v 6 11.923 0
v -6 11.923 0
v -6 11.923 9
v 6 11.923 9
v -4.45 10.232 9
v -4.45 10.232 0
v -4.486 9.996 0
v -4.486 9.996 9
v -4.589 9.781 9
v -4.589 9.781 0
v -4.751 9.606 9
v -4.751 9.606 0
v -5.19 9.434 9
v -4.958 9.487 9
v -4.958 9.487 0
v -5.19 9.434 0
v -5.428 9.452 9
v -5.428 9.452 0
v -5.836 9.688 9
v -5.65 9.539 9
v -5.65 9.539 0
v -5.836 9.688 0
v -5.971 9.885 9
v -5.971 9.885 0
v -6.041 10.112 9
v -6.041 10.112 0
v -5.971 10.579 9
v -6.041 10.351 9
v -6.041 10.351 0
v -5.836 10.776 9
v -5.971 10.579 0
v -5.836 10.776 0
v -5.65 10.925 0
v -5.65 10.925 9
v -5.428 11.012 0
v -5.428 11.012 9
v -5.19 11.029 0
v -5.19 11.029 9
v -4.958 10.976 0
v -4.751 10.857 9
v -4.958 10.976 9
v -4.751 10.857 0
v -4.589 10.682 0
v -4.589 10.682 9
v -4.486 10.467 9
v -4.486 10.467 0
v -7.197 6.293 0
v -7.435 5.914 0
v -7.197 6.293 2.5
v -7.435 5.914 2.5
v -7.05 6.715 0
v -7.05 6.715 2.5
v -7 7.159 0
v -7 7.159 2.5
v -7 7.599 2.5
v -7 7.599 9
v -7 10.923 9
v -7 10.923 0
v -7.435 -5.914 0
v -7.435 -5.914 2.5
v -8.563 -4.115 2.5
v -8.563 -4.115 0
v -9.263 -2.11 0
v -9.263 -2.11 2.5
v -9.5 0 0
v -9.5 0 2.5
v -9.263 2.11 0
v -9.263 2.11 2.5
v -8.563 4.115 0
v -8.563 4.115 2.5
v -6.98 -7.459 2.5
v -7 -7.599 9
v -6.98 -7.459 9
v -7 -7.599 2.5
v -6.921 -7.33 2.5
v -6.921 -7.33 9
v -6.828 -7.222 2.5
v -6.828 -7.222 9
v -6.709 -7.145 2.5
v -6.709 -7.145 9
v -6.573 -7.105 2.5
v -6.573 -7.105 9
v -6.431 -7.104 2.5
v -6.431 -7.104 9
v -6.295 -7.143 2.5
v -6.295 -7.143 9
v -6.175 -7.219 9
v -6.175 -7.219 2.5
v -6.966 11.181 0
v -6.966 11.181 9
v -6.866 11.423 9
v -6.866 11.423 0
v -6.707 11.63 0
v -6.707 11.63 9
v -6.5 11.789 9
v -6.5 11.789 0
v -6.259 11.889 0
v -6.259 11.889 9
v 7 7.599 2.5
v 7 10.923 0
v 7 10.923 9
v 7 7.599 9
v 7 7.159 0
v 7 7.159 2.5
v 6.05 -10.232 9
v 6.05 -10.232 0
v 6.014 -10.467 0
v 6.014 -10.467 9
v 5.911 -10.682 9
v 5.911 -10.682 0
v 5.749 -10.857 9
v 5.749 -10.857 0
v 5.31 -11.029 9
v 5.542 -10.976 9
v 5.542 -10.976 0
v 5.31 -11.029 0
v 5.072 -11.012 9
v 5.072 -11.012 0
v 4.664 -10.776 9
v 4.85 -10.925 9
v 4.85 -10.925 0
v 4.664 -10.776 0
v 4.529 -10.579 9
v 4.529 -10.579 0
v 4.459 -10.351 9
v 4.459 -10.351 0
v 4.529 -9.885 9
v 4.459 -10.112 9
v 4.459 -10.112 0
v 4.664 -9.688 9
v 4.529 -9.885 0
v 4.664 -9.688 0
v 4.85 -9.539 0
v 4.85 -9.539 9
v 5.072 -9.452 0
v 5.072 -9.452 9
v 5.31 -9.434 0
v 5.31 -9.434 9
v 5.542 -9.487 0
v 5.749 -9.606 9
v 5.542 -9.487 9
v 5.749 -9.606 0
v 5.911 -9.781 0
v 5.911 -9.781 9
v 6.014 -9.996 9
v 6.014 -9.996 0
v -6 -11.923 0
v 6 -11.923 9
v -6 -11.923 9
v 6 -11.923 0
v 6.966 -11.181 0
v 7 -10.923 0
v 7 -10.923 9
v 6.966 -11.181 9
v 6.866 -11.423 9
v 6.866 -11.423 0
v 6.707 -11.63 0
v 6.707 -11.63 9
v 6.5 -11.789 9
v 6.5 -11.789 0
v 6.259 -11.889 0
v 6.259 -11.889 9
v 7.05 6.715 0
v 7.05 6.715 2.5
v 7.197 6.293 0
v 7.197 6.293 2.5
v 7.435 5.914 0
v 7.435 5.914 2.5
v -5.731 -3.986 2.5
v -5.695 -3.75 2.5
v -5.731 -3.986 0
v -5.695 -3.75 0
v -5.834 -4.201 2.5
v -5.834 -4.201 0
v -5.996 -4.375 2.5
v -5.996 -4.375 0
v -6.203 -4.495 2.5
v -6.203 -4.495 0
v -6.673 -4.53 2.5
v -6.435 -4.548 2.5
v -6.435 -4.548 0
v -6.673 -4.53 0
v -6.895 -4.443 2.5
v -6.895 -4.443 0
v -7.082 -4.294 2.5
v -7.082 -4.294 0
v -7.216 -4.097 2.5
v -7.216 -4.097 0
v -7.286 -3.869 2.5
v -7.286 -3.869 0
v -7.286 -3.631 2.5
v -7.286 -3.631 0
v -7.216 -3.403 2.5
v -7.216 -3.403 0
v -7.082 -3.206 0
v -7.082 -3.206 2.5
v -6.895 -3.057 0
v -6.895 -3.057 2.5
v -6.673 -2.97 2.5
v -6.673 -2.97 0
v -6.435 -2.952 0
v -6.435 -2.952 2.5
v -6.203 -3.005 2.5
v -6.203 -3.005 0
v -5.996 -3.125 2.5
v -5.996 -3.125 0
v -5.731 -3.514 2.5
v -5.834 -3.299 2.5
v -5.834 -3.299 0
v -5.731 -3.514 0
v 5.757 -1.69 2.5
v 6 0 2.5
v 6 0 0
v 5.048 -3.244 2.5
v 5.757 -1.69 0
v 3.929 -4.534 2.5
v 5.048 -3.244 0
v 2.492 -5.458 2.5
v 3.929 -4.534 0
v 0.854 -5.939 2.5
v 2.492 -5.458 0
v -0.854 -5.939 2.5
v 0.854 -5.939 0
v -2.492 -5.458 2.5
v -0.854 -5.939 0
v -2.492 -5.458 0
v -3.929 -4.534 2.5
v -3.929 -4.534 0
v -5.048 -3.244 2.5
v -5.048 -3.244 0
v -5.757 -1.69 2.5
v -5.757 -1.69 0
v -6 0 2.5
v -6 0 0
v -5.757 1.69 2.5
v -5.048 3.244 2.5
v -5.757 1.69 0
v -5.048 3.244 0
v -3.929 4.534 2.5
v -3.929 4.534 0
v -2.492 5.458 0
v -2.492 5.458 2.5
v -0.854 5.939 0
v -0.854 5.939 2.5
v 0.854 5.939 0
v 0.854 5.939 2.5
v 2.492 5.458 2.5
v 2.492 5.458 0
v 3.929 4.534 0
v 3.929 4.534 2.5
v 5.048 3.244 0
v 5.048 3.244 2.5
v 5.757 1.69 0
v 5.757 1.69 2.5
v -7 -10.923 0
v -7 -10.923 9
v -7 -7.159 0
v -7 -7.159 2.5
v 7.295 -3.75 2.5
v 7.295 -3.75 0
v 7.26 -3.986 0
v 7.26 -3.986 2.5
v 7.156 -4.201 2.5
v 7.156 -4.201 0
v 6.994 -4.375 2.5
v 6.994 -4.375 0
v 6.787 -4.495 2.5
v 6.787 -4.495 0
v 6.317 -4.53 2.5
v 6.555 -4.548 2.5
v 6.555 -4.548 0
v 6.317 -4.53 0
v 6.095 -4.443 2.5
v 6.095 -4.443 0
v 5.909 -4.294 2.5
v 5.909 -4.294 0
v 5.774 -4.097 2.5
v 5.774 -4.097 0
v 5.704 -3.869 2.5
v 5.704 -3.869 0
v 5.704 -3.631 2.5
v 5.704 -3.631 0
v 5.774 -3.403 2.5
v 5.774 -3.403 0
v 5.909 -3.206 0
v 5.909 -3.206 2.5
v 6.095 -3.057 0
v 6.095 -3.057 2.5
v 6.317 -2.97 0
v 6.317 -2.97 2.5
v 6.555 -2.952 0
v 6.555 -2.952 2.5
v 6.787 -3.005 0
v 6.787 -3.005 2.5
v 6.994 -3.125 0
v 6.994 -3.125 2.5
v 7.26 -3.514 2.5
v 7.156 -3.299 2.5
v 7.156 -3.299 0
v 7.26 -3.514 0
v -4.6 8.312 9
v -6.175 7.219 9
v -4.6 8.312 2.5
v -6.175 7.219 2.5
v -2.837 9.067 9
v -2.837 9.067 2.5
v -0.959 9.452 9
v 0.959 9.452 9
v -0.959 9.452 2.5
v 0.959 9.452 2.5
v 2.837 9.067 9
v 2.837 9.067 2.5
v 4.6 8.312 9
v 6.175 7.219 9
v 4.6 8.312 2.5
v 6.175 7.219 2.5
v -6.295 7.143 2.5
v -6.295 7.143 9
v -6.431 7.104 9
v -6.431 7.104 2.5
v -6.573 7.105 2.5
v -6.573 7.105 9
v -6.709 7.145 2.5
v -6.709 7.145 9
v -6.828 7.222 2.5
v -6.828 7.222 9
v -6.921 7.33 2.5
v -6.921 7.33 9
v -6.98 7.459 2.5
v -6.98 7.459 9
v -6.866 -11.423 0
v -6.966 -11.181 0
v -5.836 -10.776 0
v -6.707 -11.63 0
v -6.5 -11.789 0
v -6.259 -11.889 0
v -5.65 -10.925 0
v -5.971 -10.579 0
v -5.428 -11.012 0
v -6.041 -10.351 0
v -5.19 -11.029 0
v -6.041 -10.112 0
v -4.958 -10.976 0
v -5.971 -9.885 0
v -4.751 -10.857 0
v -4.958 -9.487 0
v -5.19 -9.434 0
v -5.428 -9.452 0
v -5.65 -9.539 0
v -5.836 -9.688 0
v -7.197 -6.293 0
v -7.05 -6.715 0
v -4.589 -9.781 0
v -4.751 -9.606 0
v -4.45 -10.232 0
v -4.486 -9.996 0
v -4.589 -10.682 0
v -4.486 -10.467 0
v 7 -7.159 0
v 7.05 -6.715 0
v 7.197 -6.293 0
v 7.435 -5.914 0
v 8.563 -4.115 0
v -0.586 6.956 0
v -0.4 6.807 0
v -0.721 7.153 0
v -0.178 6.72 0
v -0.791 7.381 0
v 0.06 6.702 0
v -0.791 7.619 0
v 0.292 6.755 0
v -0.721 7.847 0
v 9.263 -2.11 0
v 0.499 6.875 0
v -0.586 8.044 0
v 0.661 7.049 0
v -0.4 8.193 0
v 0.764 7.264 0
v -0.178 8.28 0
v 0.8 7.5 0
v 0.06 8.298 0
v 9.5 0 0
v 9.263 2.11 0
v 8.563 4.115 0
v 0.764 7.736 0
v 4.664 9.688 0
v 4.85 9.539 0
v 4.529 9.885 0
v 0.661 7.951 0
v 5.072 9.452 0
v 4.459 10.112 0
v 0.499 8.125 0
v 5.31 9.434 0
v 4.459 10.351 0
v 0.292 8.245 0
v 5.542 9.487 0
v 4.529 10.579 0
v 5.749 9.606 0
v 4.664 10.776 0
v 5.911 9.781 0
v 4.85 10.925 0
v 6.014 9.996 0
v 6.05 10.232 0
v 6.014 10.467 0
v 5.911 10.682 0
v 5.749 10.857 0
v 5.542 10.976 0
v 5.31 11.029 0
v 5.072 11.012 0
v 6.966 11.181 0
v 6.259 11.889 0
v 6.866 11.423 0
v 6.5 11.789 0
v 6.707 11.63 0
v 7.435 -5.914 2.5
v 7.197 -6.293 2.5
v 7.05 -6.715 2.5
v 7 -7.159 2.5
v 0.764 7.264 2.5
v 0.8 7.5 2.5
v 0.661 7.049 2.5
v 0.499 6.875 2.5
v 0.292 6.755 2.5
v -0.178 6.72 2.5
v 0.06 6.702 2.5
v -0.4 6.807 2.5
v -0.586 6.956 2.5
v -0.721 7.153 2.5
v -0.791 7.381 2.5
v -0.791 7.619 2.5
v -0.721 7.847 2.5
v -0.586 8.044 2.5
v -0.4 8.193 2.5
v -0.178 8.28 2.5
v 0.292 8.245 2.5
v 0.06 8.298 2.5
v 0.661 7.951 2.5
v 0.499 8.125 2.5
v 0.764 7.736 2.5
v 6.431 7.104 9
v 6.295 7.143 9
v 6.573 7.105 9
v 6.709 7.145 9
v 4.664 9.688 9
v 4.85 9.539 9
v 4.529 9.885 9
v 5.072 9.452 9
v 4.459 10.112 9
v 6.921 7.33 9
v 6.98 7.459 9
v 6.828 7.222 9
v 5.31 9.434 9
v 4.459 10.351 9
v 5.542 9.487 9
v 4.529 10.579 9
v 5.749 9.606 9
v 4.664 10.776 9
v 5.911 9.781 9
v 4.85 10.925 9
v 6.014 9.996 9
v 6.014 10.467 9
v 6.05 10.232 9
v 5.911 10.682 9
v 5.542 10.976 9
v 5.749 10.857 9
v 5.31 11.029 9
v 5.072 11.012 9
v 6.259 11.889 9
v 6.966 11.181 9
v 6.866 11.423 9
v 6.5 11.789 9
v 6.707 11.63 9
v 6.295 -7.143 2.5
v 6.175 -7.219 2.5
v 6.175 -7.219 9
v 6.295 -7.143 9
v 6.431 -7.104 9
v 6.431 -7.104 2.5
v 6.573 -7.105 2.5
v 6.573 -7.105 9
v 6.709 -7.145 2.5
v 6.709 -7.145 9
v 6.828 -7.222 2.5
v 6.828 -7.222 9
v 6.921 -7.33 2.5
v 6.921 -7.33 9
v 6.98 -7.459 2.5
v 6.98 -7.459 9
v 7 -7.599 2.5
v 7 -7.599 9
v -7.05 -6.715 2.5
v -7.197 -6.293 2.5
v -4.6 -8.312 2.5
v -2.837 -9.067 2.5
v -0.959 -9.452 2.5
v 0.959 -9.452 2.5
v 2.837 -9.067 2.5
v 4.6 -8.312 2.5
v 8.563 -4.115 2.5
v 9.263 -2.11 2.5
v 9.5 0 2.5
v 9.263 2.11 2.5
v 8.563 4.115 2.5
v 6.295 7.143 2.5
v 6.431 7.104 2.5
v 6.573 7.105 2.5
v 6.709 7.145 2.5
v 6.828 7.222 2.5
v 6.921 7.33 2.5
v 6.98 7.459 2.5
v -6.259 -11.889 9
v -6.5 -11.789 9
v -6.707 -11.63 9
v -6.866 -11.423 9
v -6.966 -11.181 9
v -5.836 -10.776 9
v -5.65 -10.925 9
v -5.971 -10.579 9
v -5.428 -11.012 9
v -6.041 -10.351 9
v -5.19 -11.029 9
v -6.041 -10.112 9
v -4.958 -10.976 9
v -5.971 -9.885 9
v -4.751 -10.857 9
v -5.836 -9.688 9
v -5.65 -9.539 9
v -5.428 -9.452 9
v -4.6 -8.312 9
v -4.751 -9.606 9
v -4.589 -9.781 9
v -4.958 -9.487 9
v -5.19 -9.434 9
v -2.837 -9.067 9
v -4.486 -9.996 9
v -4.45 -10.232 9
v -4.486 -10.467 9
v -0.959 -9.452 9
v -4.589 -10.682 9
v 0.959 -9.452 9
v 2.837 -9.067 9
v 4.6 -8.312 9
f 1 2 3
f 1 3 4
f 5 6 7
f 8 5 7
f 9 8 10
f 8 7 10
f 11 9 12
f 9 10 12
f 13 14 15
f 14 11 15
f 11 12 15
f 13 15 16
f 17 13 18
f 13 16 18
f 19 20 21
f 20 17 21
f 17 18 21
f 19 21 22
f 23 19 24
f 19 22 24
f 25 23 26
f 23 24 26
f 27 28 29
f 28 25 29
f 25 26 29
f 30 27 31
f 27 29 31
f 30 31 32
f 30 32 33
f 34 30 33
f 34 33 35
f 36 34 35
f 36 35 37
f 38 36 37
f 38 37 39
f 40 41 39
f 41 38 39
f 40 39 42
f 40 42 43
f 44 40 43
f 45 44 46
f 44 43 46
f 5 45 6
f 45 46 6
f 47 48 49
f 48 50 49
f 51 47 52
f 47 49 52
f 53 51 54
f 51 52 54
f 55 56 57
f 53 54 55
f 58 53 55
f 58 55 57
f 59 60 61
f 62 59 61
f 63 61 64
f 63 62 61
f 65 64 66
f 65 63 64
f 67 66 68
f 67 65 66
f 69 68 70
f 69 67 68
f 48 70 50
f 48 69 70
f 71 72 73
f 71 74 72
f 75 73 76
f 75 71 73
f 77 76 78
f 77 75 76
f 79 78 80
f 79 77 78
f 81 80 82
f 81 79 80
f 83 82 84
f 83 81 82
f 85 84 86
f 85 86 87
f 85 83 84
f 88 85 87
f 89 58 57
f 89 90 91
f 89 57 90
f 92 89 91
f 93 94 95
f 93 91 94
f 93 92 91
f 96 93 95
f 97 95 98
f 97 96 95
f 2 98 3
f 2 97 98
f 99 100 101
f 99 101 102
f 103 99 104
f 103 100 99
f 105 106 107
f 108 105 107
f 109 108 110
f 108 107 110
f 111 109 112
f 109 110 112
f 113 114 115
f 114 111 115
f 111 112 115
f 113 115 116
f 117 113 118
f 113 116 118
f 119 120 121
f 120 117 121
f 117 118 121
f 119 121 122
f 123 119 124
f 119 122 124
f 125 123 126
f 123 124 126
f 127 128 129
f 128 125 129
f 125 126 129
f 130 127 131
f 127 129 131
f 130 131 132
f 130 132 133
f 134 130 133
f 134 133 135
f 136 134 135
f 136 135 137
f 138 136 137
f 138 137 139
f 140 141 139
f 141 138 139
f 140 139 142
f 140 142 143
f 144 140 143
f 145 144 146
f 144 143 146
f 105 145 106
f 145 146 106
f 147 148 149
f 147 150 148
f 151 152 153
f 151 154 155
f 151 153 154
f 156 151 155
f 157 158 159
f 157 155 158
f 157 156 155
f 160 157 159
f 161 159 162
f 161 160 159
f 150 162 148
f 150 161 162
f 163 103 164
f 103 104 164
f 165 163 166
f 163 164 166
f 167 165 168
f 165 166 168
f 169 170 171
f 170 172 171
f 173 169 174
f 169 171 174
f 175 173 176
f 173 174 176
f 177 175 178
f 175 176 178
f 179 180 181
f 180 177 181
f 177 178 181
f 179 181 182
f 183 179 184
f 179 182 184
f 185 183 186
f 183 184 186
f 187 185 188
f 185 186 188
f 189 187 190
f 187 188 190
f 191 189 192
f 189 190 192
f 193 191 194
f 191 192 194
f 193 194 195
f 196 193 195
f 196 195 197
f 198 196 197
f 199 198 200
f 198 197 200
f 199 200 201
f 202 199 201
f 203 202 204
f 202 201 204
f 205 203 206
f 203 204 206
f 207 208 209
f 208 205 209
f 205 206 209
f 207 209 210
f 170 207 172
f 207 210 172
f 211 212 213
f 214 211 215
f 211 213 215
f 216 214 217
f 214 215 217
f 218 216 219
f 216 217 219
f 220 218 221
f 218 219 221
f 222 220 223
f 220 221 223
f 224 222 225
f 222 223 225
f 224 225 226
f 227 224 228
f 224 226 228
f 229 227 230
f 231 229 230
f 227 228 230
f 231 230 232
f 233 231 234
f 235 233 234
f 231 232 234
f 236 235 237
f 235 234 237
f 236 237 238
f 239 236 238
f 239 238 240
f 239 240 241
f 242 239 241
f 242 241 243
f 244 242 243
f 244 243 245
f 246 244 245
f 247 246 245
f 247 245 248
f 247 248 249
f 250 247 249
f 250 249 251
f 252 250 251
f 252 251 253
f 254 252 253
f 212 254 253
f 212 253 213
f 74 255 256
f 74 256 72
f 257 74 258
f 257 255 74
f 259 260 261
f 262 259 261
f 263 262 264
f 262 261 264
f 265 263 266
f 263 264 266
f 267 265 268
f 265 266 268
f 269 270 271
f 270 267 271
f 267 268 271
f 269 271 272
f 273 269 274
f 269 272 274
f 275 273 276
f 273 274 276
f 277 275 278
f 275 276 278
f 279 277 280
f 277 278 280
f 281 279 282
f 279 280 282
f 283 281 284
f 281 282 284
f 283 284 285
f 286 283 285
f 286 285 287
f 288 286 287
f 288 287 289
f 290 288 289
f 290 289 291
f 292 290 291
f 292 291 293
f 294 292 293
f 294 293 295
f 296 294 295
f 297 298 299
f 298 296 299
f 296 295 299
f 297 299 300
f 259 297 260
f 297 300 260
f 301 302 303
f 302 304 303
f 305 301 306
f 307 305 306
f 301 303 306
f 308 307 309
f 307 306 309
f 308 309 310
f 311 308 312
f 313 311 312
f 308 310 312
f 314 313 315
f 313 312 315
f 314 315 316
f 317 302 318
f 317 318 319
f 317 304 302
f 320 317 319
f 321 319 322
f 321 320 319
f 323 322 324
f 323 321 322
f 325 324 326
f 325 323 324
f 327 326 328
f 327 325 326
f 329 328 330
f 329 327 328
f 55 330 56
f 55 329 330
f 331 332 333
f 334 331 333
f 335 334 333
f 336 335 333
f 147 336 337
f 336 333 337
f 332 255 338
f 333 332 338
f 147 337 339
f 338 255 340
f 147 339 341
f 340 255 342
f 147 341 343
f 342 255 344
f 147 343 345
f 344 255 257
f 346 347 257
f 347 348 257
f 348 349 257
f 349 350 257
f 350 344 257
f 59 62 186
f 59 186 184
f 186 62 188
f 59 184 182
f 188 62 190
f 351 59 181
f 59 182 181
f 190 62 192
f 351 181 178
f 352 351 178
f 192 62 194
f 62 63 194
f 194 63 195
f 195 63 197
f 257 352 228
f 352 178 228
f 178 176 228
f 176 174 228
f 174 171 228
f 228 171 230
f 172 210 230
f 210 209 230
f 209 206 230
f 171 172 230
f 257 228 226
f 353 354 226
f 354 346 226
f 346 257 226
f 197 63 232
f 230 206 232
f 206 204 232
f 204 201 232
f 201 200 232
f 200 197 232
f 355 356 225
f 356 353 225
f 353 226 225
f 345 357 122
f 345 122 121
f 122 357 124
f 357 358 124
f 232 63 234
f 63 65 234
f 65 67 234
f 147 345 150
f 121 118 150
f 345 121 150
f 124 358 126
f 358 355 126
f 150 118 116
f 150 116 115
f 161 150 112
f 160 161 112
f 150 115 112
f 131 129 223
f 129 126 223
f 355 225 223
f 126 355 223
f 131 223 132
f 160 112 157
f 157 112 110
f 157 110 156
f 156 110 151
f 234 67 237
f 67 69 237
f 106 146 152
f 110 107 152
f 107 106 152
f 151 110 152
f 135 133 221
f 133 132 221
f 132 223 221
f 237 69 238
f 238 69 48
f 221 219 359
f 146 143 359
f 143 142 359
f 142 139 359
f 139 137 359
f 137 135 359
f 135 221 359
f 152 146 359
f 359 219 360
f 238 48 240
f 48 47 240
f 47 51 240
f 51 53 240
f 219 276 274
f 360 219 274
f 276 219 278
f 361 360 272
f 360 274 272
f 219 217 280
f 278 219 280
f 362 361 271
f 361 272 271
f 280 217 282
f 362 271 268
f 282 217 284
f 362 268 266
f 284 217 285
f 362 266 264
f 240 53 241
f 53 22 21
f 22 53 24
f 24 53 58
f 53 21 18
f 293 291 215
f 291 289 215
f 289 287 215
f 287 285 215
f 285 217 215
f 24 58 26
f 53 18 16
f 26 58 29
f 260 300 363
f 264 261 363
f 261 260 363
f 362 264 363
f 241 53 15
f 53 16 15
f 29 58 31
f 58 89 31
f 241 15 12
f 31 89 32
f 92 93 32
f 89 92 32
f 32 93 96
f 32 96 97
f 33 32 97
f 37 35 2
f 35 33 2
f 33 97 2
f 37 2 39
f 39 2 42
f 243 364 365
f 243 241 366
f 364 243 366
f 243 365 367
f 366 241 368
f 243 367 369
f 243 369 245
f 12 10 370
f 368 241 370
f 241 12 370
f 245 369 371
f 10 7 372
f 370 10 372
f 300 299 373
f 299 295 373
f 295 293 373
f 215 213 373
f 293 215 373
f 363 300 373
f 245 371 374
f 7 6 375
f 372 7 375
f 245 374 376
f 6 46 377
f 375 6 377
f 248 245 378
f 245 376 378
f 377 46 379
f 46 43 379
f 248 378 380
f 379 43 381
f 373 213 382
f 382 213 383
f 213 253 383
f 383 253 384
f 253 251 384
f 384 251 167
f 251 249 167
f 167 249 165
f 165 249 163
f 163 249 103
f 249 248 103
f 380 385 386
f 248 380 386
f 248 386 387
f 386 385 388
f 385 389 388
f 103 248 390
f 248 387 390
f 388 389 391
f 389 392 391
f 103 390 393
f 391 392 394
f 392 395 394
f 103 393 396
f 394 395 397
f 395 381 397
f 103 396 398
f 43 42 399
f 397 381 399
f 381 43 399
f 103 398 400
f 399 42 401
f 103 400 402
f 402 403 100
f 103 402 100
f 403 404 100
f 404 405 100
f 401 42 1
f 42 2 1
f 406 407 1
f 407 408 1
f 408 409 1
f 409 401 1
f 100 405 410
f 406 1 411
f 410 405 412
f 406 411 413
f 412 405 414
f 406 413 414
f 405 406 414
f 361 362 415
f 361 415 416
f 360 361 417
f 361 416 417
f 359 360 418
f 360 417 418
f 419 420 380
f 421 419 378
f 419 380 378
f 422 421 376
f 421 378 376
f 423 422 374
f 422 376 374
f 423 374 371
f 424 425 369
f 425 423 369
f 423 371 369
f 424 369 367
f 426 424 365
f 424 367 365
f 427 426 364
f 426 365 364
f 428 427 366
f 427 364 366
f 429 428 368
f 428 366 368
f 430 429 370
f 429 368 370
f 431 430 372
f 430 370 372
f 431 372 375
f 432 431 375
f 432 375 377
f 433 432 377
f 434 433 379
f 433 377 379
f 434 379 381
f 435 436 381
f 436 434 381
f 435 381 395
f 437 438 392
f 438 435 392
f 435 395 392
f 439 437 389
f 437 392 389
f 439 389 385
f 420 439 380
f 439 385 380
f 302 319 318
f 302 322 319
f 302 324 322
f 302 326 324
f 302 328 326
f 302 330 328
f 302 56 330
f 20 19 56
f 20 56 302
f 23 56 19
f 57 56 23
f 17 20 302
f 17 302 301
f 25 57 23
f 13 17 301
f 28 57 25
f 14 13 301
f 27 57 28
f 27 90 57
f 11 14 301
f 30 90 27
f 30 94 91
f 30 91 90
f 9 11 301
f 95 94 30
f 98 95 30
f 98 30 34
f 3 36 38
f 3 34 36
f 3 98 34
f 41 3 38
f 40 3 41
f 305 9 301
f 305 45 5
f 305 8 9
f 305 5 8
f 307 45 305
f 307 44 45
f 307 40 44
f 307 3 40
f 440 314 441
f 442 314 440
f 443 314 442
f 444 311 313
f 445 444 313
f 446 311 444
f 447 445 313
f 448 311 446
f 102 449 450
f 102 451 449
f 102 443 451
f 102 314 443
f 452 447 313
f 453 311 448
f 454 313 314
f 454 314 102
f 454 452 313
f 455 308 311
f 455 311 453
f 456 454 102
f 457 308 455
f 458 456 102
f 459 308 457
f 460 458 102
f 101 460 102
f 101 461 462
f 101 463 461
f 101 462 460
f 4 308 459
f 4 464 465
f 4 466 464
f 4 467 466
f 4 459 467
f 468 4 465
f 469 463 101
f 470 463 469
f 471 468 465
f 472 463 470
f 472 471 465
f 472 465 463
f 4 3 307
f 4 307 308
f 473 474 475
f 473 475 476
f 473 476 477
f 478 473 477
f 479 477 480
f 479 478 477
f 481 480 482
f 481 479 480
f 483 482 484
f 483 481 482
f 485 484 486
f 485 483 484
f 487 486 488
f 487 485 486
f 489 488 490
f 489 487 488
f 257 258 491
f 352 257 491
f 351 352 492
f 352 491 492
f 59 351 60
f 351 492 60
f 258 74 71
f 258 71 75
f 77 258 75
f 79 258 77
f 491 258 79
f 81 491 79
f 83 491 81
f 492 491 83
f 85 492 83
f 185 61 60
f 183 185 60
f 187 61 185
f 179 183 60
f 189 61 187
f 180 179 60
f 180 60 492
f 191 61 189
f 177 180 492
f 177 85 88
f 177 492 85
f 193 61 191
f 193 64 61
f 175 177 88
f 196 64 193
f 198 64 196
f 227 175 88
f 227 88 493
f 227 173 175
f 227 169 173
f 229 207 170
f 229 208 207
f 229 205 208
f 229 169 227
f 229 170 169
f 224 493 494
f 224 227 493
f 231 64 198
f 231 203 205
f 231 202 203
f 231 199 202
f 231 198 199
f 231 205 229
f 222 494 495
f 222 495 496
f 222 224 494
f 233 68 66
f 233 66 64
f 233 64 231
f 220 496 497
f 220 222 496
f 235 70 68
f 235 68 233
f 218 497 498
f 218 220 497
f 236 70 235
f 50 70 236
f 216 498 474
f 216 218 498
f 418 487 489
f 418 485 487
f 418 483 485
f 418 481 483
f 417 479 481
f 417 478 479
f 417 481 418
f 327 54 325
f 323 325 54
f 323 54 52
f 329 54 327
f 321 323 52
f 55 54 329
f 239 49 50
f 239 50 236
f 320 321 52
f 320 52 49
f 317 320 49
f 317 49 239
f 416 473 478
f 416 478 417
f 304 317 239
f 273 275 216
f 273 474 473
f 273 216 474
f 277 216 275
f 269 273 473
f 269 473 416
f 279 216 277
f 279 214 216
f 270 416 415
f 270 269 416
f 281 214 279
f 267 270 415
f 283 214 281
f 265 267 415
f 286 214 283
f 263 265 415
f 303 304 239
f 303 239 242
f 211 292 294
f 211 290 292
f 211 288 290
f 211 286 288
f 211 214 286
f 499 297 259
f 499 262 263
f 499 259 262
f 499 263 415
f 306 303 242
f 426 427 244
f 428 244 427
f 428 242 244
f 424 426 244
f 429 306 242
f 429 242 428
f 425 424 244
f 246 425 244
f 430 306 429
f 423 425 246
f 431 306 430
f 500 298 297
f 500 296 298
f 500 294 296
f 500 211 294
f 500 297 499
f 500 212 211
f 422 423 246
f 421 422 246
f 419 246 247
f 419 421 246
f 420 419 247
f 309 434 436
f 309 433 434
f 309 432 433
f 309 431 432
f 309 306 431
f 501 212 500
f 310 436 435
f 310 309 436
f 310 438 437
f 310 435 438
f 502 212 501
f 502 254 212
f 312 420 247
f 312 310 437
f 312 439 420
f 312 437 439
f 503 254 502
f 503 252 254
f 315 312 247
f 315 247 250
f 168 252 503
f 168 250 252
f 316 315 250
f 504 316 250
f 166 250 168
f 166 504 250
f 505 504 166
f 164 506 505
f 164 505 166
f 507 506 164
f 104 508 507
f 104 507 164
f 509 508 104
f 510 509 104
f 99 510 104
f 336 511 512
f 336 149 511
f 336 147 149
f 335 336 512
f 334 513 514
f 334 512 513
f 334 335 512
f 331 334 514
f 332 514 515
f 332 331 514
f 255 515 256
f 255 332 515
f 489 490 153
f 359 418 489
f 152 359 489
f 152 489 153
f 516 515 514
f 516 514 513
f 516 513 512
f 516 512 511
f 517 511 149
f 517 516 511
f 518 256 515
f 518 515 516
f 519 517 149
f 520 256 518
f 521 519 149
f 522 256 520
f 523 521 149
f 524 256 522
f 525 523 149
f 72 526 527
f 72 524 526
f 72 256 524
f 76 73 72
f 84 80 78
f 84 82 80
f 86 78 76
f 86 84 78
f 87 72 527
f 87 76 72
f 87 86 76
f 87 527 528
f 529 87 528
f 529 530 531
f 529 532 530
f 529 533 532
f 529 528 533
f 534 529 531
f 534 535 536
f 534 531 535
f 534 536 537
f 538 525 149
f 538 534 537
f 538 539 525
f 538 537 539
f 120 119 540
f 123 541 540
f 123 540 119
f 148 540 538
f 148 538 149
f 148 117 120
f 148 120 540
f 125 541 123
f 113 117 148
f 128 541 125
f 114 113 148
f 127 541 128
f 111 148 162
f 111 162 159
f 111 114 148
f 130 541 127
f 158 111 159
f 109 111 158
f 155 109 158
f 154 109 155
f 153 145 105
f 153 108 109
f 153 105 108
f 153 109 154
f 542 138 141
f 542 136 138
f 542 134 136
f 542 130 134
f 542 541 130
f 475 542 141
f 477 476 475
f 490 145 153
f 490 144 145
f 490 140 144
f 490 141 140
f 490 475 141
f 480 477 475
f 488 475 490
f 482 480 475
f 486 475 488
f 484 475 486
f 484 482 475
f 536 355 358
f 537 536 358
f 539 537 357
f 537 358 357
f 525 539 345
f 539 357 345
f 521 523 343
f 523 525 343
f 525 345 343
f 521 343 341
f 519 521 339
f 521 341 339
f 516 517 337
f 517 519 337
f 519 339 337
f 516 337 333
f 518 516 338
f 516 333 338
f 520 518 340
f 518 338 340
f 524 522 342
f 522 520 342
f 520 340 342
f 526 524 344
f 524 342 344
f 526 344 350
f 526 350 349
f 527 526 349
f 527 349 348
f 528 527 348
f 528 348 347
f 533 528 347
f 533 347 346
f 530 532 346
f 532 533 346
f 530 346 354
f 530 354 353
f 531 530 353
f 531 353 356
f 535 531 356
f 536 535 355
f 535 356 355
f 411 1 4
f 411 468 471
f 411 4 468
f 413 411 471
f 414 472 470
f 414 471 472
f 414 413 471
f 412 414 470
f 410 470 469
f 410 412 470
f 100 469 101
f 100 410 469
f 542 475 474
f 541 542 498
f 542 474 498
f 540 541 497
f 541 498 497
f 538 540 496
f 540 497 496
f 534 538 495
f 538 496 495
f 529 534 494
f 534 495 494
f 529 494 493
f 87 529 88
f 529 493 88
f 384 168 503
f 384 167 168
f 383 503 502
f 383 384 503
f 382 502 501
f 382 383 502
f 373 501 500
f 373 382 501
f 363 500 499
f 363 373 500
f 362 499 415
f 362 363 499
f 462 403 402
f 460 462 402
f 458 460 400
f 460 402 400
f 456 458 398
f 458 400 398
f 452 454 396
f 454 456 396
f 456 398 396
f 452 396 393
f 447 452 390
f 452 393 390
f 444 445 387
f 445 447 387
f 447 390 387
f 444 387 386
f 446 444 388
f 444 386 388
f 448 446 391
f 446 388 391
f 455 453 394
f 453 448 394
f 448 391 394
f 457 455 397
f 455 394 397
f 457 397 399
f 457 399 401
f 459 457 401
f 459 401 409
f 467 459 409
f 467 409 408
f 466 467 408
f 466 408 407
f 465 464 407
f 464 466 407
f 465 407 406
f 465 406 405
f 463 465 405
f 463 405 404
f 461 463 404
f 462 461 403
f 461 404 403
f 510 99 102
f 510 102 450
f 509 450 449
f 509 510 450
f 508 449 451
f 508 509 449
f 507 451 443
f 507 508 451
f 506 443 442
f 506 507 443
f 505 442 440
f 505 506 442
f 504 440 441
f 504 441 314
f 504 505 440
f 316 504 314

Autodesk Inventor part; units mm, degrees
ref_plane "YZ Plane" through (0, 0, 0) normal (1, 0, 0) x (0, 1, 0)
ref_plane "XZ Plane" through (0, 0, 0) normal (0, 1, 0) x (-1, 0, 0)
ref_plane "XY Plane" through (0, 0, 0) normal (0, 0, 1) x (1, 0, 0)
sketch "スケッチ1" plane through (0, 0, 0) normal (0, 0, 1) x (1, 0, 0)
  circle A0 centre (0, 0) radius 2.5
  circle A1 centre (0, 0) radius 6
  circle A2 centre (0, 0) radius 9.5
  circle A3 centre (0, 7.5) radius 0.8
  circle A4 centre (0, 0) radius 7.5 construction
  line L0 (0, -20.3) -> (0, 20.3)
  circle A5 centre (-6.495191, -3.75) radius 0.8
  circle A6 centre (6.495191, -3.75) radius 0.8
  circle A7 centre (0, 0) radius 14.5 construction
  line L1 (-7, 6.422616) -> (-7, 10.922616)
  line L2 (-6, 11.922616) -> (6, 11.922616)
  line L3 (7, 10.922616) -> (7, 6.422616)
  arc A8 (-6, 11.922616) -> (-7, 10.922616) centre (-6, 10.922616) ccw
  arc A9 (7, 10.922616) -> (6, 11.922616) centre (6, 10.922616) ccw
  circle A10 centre (5.25, 10.231691) radius 2 construction
  circle A11 centre (5.25, 10.231691) radius 0.8
  circle A12 centre (-5.25, 10.231691) radius 2 construction
  circle A13 centre (-5.25, 10.231691) radius 0.8
  line L4 (-5.25, 10.231691) -> (-5.25, 7.917544) construction
  line L5 (5.25, 10.231691) -> (5.25, 7.917544) construction
  circle A14 centre (5.25, -10.231691) radius 0.8
  line L6 (7, -6.422616) -> (7, -10.922616)
  arc A15 (6, -11.922616) -> (7, -10.922616) centre (6, -10.922616) ccw
  line L7 (6, -11.922616) -> (-6, -11.922616)
  circle A16 centre (-5.25, -10.231691) radius 2 construction
  line L8 (-7, -10.922616) -> (-7, -6.422616)
  arc A17 (-7, -10.922616) -> (-6, -11.922616) centre (-6, -10.922616) ccw
  circle A18 centre (-5.25, -10.231691) radius 0.8
  circle A19 centre (5.25, -10.231691) radius 2 construction
  dimension "d4" = 15
  dimension "d0" = 5
  dimension "d1" = 12
  dimension "d2" = 19
  dimension "d3" = 1.6
  dimension "d7" = 360
  dimension "d13" = 29
  dimension "d14" = 1
  dimension "d15" = 12
  dimension "d16" = 4.5
  dimension "d17" = 4
  dimension "d18" = 1.6
  dimension "d19" = 10.5
  dimension "d22" = 360
extrude "押し出し1" add sketch "スケッチ1" along normal blind 1.25 contours L0 A3 A2 A1 | A1 L0 A2 A3
extrude "押し出し2" add sketch "スケッチ1" along normal blind 2.5 contours L0 A3 A2 A1 | A1 L0 A2 A3
extrude "押し出し3" add sketch "スケッチ1" along normal blind 9 contours L0 L7 A17 L8 A2 | A2 L6 A15 L7 L0 | L0 L2 A9 L3 A2 | A2 L1 A8 L2 L0
fillet "フィレット1" radius 2 4 edges at (-7, 6.4226, 1.25) (-7, -6.4226, 1.25) (7, 6.4226, 1.25) (7, -6.4226, 1.25)
fillet "フィレット2" radius 0.5 4 edges at (7, 6.4226, 5.75) (7, -6.4226, 5.75) (-7, -6.4226, 5.75) (-7, 6.4226, 5.75)
properties part number "MotorMount_sub"
